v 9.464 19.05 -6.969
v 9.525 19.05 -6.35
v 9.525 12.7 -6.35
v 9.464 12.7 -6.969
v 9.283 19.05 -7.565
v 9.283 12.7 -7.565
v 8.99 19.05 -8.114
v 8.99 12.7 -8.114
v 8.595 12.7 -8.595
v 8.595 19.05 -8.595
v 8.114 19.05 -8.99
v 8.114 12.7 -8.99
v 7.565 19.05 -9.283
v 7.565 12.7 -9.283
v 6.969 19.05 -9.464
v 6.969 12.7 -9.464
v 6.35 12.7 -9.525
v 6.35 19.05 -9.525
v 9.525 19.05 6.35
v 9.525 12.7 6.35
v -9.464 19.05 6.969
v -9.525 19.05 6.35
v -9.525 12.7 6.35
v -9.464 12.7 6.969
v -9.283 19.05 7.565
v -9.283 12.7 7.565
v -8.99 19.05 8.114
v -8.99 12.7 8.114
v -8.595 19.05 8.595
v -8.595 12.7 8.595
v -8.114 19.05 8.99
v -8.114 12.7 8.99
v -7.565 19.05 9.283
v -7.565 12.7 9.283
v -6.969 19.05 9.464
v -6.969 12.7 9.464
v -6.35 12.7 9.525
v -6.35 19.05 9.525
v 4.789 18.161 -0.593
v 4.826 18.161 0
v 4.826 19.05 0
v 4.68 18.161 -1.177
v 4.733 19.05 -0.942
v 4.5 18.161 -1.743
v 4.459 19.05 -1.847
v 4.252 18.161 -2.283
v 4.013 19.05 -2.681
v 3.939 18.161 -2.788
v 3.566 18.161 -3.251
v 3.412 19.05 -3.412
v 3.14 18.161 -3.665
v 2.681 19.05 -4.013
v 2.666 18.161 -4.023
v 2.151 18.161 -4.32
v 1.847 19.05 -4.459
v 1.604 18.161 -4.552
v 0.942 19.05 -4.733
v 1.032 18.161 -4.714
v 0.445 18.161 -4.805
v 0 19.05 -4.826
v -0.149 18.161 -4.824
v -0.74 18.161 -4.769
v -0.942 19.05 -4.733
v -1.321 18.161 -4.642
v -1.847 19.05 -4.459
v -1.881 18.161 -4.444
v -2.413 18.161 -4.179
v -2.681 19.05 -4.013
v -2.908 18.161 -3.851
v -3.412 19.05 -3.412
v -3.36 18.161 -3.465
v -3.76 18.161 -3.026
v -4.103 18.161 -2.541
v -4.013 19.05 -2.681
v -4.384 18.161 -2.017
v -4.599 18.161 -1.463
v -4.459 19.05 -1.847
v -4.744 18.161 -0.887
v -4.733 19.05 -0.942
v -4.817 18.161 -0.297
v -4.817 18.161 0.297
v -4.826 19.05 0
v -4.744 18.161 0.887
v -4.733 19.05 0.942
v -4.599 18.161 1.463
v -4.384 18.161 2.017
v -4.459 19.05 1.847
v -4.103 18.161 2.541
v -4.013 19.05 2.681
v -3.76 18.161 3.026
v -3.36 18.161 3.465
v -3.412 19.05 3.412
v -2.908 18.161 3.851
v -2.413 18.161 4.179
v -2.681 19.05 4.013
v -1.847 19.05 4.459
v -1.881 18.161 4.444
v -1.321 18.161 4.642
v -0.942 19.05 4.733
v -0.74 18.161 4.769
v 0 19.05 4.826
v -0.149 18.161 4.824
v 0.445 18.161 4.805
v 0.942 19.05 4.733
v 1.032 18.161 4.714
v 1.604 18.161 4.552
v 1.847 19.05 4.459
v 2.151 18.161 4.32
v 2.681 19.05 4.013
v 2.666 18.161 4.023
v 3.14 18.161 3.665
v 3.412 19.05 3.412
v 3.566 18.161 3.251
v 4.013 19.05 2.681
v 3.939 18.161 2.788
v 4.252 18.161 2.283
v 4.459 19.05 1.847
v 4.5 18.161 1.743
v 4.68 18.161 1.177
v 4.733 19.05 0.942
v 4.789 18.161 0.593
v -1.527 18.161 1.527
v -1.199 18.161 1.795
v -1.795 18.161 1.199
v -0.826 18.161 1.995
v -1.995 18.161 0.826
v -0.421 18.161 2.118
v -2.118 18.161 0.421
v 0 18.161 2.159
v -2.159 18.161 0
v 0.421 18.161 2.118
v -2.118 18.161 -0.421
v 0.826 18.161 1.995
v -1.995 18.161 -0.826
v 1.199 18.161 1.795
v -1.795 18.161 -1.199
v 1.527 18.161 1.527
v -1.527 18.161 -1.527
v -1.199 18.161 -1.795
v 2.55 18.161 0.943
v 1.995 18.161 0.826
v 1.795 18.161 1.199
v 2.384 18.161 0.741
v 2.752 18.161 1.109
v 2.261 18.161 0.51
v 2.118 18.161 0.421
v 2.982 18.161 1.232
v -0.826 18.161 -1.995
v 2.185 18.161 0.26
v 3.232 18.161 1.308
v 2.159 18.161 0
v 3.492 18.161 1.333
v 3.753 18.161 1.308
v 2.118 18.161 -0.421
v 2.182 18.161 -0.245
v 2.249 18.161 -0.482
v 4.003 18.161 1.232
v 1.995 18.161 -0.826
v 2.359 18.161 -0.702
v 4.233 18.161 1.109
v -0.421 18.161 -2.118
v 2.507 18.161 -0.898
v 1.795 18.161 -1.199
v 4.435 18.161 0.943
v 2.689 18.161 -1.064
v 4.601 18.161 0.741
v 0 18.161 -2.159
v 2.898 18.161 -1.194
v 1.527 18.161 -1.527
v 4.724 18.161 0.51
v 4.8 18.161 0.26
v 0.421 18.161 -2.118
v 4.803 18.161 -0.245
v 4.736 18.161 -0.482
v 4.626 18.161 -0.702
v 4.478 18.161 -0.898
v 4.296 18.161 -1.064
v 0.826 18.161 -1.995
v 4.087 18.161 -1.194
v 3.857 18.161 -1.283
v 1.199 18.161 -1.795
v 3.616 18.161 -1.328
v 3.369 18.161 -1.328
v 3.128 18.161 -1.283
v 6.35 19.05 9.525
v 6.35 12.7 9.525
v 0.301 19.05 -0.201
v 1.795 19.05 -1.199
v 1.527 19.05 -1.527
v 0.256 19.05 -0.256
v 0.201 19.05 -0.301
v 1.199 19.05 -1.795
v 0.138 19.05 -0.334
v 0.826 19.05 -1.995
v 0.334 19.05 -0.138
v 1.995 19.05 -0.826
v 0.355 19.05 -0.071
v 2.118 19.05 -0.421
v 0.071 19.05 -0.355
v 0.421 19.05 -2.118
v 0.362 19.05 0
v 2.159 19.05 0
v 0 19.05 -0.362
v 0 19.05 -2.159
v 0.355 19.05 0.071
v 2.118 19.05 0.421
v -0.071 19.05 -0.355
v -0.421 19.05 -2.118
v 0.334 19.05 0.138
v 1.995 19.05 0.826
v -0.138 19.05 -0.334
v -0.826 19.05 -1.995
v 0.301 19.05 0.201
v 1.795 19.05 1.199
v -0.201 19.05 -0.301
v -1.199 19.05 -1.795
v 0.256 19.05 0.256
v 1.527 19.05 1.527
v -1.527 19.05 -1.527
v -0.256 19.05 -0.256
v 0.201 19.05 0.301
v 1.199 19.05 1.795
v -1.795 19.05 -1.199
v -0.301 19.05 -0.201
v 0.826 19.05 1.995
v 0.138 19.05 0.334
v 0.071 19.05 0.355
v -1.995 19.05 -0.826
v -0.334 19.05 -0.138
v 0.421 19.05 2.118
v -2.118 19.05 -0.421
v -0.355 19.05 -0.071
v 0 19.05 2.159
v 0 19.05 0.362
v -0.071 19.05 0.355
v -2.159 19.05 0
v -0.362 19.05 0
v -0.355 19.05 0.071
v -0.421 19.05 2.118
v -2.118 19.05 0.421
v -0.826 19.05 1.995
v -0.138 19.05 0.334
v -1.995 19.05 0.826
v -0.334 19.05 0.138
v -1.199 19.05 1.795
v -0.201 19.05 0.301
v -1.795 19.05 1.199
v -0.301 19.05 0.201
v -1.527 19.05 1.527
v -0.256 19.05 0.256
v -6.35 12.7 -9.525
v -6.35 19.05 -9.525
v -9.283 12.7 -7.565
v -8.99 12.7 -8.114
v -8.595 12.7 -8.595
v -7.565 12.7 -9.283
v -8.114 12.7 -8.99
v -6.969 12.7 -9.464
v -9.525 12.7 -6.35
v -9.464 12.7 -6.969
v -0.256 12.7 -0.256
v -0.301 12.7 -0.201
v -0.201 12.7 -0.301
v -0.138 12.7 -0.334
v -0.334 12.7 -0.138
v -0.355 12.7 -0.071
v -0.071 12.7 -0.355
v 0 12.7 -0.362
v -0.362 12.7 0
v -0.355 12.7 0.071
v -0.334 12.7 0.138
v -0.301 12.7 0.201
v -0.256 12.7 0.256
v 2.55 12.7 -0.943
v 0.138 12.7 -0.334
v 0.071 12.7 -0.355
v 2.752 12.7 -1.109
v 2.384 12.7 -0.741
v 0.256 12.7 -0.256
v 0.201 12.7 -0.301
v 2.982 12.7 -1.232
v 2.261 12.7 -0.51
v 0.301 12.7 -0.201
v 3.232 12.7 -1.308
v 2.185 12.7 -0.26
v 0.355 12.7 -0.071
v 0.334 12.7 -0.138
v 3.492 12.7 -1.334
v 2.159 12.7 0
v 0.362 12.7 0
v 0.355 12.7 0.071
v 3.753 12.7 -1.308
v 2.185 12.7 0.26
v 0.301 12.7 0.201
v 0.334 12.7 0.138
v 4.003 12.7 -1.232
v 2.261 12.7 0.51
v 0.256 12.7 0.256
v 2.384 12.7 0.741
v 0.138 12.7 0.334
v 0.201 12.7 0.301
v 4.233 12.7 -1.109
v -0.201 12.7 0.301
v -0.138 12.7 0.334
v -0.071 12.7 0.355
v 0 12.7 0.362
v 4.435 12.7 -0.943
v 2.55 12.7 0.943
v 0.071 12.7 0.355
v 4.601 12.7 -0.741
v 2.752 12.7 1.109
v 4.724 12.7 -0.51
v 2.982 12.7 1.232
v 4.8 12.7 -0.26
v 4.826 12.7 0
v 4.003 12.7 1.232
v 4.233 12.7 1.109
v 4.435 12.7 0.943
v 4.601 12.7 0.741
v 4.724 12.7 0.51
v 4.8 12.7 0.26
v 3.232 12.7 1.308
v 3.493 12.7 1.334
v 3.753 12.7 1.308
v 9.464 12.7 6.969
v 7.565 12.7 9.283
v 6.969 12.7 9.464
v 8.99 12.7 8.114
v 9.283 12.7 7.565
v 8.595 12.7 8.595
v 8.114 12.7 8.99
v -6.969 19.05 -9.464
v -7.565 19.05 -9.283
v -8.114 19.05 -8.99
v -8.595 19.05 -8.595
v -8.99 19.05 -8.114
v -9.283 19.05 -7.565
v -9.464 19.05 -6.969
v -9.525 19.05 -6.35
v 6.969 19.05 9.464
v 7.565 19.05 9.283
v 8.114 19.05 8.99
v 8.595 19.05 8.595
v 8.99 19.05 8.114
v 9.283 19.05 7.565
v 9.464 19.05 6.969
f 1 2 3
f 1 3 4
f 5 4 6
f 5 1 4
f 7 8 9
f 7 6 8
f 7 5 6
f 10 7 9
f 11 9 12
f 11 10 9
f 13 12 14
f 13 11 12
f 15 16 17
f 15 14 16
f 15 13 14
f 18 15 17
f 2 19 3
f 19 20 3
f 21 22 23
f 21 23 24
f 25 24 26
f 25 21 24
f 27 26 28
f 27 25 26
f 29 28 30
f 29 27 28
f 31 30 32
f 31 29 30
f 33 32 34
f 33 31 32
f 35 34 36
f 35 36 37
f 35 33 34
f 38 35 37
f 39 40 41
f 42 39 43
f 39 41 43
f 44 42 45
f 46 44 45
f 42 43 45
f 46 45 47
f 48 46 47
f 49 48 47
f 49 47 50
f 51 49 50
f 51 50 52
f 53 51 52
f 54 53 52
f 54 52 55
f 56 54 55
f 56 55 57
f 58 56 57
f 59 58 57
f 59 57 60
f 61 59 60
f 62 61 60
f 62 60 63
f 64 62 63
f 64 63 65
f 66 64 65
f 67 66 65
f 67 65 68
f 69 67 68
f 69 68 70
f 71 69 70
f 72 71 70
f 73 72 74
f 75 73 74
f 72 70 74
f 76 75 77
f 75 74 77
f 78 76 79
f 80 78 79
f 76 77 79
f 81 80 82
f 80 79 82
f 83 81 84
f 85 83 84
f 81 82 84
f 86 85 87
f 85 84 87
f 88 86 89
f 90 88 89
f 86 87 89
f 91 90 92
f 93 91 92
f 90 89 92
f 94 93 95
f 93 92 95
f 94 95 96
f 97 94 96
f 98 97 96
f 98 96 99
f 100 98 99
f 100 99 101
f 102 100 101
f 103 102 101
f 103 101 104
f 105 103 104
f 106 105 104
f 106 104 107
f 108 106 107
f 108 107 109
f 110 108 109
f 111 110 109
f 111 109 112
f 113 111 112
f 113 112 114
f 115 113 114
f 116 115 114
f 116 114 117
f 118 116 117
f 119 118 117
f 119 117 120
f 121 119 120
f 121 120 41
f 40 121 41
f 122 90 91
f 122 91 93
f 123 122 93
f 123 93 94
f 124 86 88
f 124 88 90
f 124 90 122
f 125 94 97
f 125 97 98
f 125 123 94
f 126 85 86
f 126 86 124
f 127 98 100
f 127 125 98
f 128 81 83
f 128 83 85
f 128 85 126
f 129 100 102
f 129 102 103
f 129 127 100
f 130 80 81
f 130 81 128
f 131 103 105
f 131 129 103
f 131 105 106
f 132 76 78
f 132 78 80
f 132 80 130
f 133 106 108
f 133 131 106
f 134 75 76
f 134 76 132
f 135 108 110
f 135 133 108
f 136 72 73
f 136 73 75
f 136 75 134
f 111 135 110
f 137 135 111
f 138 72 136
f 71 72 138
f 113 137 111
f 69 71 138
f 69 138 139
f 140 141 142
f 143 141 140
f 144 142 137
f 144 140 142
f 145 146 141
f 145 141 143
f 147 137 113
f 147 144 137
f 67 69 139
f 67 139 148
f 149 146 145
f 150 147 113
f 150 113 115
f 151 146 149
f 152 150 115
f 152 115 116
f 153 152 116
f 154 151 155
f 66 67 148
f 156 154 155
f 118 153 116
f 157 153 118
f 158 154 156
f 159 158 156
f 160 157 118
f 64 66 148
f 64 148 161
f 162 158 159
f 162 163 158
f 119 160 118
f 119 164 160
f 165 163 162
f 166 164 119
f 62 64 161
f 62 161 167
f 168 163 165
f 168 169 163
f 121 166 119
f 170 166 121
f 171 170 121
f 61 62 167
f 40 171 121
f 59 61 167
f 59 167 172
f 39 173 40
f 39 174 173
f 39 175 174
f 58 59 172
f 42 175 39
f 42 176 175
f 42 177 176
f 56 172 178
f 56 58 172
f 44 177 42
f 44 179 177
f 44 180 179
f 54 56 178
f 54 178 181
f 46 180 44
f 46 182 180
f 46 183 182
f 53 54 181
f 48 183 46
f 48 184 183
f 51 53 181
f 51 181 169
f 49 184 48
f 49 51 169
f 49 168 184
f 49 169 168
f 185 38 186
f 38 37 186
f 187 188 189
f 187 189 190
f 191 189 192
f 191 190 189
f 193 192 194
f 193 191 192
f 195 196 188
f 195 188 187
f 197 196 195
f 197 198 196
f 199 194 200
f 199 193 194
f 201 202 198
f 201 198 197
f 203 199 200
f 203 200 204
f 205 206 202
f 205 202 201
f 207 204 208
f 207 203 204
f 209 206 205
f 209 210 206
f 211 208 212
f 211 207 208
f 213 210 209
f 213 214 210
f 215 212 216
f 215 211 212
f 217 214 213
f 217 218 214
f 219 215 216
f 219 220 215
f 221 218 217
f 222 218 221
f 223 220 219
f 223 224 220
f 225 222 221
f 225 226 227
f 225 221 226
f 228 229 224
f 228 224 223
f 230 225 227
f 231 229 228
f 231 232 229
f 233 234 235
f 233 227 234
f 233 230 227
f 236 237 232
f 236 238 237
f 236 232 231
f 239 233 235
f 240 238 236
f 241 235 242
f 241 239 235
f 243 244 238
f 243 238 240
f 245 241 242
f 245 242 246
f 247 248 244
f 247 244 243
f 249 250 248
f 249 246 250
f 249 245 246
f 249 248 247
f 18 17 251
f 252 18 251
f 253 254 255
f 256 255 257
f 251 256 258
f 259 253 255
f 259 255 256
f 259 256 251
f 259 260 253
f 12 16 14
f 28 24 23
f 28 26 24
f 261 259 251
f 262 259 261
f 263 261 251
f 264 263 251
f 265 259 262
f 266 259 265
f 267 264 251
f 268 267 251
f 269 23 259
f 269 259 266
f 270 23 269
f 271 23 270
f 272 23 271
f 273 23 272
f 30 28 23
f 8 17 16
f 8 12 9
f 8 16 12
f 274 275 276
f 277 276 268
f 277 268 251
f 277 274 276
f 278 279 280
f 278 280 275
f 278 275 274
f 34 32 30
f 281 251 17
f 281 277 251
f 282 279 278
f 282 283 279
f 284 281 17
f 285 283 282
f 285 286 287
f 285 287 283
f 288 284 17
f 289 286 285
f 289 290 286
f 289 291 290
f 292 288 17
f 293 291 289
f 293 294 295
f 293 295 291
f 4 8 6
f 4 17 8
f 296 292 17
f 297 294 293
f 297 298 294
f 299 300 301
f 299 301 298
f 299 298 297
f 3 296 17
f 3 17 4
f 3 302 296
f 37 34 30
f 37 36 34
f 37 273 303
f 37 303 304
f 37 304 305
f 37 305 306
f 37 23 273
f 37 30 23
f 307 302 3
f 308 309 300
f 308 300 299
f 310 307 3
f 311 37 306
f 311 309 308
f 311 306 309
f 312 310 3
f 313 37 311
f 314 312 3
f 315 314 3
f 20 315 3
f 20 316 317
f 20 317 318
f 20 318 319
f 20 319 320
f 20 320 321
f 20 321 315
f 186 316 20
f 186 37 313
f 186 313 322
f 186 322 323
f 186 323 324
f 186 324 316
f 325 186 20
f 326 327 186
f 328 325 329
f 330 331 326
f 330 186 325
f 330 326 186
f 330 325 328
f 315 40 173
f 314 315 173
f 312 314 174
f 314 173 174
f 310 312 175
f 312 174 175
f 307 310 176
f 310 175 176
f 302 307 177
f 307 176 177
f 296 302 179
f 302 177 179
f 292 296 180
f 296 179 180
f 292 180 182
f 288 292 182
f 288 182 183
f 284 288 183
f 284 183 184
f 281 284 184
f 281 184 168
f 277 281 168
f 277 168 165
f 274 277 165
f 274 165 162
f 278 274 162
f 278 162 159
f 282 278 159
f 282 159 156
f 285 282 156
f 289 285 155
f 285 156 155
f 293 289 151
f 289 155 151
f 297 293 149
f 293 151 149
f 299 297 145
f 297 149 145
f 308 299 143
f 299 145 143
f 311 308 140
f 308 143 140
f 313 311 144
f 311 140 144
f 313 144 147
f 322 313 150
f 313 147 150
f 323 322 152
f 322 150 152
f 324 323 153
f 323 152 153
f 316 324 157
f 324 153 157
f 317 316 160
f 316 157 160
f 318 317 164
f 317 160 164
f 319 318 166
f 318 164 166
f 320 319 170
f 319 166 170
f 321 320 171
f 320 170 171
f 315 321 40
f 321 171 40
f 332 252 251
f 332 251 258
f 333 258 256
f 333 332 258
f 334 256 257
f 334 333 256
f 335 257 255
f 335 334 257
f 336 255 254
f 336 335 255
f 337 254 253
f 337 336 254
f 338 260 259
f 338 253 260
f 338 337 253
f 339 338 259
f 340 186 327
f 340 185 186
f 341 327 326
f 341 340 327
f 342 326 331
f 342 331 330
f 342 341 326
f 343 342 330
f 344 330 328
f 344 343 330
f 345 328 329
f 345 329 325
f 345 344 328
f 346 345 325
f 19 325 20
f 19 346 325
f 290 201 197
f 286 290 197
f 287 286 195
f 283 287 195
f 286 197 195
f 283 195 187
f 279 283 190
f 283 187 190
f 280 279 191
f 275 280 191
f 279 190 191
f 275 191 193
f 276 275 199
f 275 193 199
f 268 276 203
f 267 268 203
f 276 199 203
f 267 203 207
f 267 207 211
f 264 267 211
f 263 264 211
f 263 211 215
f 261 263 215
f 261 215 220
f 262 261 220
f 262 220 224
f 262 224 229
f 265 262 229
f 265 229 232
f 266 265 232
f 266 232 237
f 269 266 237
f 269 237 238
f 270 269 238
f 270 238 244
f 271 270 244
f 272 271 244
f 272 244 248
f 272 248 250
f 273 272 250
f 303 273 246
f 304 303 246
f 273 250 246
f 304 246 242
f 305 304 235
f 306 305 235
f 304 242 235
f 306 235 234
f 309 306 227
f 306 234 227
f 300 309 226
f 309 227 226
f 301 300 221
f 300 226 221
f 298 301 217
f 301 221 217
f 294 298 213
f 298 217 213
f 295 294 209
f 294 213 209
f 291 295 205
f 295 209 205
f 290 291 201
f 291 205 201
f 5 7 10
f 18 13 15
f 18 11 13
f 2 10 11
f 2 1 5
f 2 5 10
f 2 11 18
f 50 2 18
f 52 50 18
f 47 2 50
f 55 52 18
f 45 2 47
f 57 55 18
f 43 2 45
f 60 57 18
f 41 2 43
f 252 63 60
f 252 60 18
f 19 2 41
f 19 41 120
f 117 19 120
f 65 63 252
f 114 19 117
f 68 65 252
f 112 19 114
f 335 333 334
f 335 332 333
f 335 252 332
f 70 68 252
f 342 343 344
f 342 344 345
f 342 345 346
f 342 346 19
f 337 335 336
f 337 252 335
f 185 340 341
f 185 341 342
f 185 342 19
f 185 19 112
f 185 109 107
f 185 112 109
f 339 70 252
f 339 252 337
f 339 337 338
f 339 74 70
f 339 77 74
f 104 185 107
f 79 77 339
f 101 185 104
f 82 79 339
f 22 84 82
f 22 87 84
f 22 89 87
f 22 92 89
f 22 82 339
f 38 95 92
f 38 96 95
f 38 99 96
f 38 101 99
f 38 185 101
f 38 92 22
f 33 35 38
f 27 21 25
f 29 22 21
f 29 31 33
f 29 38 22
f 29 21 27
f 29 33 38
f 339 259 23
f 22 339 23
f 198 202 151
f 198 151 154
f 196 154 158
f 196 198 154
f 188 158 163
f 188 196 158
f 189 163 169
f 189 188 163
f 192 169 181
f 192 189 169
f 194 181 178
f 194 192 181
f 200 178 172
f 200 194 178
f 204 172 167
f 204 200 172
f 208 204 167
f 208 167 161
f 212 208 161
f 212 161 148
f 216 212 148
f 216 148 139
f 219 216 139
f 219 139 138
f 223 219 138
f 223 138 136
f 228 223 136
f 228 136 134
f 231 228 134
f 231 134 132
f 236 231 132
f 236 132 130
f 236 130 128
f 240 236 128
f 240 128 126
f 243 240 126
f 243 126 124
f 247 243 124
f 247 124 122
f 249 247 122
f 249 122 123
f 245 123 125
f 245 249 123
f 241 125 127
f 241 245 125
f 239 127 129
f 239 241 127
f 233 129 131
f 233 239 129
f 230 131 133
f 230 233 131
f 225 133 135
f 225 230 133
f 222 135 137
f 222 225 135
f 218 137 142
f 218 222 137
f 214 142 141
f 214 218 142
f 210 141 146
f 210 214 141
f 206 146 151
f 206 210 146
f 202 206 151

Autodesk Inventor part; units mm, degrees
ref_plane "YZ Plane" through (0, 0, 0) normal (1, 0, 0) x (0, 1, 0)
ref_plane "XZ Plane" through (0, 0, 0) normal (0, 1, 0) x (-1, 0, 0)
ref_plane "XY Plane" through (0, 0, 0) normal (0, 0, 1) x (1, 0, 0)
sketch "Sketch1" plane through (0, 0, 0) normal (0, 1, 0) x (-1, 0, 0)
  line L0 (9.525, 9.525) -> (-9.525, 9.525)
  line L1 (-9.525, 9.525) -> (-9.525, -9.525)
  line L2 (-9.525, -9.525) -> (9.525, -9.525)
  line L3 (9.525, -9.525) -> (9.525, 9.525)
  point P0 (0, 0)
  dimension "d0" = 19.05
  dimension "d1" = 19.05
  dimension "d2" = 9.525
  dimension "d3" = 9.525
extrude "Extrusion1" add sketch "Sketch1" along normal blind 19.05
sketch "Sketch2" plane through (0, 0, 0) normal (0, -1, 0) x (1, 0, 0)
  line L0 (6.35, 6.35) -> (-6.35, 6.35)
  line L1 (-6.35, 6.35) -> (-6.35, -6.35)
  line L2 (-6.35, -6.35) -> (6.35, -6.35)
  line L3 (6.35, -6.35) -> (6.35, 6.35)
  point P0 (0, 0)
  dimension "d6" = 12.7
  dimension "d7" = 12.7
  dimension "d8" = 6.35
  dimension "d9" = 6.35
extrude "Extrusion2" cut sketch "Sketch2" against normal blind 12.7
sketch "Sketch3" plane through (0, 19.05, 0) normal (0, 1, 0) x (1, 0, 0)
  circle A0 centre (0, 0) radius 4.826
  circle A1 centre (0, 0) radius 2.159
  dimension "d12" = 9.652
  dimension "d13" = 4.318
extrude "Extrusion3" cut sketch "Sketch3" against normal blind 0.889
sketch "Sketch4" plane through (0, 19.05, 0) normal (0, 1, 0) x (1, 0, 0)
  circle A0 centre (0, 0) radius 0.3619
  dimension "d16" = 0.7239
extrude "Extrusion4" cut sketch "Sketch4" against normal through all
sketch "Sketch5" plane through (0, 18.161, 0) normal (0, 1, 0) x (1, 0, 0)
  circle A0 centre (3.4925, 0) radius 1.3335
  circle A1 centre (0, 0) radius 2.159 projected
  line L0 (0, 0) -> (3.4925, 0) construction
  dimension "d19" = 2.667
  dimension "d20" = 3.4925
extrude "Extrusion5" cut sketch "Sketch5" against normal through all contours A0
sketch "Sketch7" plane through (-9.525, 0, 9.525) normal (0, 0, 1) x (1, 0, 0)
  line L0 (0, 0) -> (0, 19.05) projected
  line L1 (0, 12.7) -> (19.05, 12.7)
  line L2 (19.05, 12.7) -> (19.05, 0)
  line L3 (19.05, 0) -> (0, 0)
  line L4 (0, 0) -> (0, 12.7)
  point P0 (9.525, 0)
  dimension "d23" = 12.7
  dimension "d24" = 19.05
extrude "Extrusion6" cut sketch "Sketch7" against normal through all
fillet "Fillet1" radius 3.175 4 edges at (-9.525, 15.875, 9.525) (9.525, 15.875, 9.525) (9.525, 15.875, -9.525) (-9.525, 15.875, -9.525)
properties part number "Unit_v1"
